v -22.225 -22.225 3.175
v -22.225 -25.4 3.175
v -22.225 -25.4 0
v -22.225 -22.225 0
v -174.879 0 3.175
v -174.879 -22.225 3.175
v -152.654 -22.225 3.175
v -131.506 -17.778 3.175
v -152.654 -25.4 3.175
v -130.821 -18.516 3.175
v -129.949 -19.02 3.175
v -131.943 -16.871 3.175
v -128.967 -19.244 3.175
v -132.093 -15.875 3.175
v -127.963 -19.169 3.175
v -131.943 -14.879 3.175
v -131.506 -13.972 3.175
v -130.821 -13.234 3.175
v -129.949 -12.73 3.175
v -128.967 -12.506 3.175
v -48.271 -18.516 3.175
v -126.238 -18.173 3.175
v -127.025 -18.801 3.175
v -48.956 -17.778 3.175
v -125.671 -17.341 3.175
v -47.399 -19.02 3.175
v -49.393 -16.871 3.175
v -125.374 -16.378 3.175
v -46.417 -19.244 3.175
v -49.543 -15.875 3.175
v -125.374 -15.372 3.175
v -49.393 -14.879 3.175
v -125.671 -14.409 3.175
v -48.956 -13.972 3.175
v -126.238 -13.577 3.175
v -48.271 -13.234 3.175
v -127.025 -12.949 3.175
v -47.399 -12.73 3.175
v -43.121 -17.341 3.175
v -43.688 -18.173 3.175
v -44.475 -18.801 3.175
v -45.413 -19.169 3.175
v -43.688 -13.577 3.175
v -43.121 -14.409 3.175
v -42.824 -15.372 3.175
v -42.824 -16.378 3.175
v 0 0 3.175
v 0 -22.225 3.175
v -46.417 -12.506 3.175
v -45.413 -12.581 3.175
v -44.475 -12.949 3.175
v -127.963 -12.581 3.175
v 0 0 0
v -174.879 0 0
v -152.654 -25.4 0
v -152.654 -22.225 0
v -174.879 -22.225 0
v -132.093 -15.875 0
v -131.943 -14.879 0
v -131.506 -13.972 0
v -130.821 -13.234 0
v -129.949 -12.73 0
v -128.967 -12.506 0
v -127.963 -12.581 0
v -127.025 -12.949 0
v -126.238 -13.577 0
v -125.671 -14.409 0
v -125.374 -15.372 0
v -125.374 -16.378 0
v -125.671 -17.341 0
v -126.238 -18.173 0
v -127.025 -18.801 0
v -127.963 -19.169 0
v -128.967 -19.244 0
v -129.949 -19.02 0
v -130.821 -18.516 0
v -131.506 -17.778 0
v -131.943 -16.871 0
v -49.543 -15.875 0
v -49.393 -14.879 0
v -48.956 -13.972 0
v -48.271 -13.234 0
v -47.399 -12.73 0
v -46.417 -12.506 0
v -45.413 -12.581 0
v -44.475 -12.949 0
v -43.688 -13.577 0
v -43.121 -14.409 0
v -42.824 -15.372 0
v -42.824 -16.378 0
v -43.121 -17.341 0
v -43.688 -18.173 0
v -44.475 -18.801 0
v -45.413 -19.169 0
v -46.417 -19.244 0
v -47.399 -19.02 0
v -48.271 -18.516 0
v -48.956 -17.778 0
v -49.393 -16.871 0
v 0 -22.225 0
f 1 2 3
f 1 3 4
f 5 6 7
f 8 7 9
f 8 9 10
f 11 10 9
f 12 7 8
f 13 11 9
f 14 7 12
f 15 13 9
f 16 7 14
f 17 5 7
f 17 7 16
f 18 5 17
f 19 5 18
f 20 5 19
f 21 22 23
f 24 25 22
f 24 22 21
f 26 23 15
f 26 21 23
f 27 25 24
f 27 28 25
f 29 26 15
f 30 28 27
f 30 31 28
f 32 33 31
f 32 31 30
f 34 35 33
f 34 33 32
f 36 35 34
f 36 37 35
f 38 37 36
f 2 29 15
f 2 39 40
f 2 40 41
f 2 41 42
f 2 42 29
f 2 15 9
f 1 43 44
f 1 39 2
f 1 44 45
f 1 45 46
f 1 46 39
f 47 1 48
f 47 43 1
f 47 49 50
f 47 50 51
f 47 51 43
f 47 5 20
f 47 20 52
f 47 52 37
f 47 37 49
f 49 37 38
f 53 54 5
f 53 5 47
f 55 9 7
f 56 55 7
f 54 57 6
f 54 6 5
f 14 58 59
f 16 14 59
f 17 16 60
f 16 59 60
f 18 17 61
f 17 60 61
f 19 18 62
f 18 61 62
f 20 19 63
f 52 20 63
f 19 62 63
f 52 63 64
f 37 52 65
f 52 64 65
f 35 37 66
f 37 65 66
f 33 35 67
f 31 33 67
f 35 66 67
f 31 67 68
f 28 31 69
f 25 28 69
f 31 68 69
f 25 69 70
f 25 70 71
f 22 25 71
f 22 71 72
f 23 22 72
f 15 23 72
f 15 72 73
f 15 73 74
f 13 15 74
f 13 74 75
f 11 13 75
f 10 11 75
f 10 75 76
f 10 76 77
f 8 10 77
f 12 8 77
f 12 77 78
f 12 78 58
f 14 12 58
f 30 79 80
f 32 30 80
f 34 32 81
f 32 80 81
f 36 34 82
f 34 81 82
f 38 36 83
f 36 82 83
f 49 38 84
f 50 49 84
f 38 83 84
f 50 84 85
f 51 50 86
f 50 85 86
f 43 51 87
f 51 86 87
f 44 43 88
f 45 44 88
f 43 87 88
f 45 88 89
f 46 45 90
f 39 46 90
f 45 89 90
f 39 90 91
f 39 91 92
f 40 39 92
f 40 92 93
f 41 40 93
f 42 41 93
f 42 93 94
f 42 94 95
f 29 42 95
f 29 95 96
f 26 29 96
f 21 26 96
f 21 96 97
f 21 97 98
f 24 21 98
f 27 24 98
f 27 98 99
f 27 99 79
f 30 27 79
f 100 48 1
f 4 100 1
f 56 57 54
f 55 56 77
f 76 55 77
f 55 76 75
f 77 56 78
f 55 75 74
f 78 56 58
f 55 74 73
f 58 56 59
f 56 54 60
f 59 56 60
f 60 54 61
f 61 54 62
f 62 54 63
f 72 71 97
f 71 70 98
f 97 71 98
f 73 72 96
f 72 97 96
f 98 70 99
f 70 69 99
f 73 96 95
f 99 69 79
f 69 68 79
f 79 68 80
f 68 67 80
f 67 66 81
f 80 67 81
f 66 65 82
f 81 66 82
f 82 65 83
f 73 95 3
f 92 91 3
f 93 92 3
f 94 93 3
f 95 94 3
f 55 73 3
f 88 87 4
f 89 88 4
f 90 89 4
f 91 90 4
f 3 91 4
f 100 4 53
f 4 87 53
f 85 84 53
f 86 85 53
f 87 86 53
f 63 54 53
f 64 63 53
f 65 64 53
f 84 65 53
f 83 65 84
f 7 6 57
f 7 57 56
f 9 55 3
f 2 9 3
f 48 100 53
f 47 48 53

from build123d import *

# Parameters (mm, degrees)
SKETCH1_W               = 174.879
SKETCH1_H               = 25.4
BOSS_EXTRUDE1_DEPTH     = 3.175
SKETCH2_W               = 22.225
SKETCH2_H               = 3.175
CUT_EXTRUDE1_DEPTH      = 177.742482912
F_1_4_CLEARANCE_HOLE1_D = 6.7564


with BuildPart() as part:
    # Sketch1 → Boss-Extrude1 (new body)
    with BuildSketch(Plane.XY):
        with Locations((-87.4395, -12.7)):
            Rectangle(SKETCH1_W, SKETCH1_H)
    extrude(amount=BOSS_EXTRUDE1_DEPTH)

    # Sketch2 → Cut-Extrude1 (cut, through all)
    with BuildSketch(Plane.XY.offset(3.175)):
        with Locations((-163.7665, -23.8125)):
            Rectangle(SKETCH2_W, SKETCH2_H)
    cut_extrude1 = extrude(amount=-CUT_EXTRUDE1_DEPTH, mode=Mode.SUBTRACT)

    # Mirror1: Cut-Extrude1 across plane
    add(cut_extrude1.mirror(Plane.ZY.offset(87.4395)), mode=Mode.SUBTRACT)

    # 1/4 Clearance Hole1 (through all)
    with Locations(Plane.XY.offset(3.175)):
        with Locations((-46.1645, -15.875), (-128.7145, -15.875)):
            Hole(F_1_4_CLEARANCE_HOLE1_D / 2)


solid = part.part
